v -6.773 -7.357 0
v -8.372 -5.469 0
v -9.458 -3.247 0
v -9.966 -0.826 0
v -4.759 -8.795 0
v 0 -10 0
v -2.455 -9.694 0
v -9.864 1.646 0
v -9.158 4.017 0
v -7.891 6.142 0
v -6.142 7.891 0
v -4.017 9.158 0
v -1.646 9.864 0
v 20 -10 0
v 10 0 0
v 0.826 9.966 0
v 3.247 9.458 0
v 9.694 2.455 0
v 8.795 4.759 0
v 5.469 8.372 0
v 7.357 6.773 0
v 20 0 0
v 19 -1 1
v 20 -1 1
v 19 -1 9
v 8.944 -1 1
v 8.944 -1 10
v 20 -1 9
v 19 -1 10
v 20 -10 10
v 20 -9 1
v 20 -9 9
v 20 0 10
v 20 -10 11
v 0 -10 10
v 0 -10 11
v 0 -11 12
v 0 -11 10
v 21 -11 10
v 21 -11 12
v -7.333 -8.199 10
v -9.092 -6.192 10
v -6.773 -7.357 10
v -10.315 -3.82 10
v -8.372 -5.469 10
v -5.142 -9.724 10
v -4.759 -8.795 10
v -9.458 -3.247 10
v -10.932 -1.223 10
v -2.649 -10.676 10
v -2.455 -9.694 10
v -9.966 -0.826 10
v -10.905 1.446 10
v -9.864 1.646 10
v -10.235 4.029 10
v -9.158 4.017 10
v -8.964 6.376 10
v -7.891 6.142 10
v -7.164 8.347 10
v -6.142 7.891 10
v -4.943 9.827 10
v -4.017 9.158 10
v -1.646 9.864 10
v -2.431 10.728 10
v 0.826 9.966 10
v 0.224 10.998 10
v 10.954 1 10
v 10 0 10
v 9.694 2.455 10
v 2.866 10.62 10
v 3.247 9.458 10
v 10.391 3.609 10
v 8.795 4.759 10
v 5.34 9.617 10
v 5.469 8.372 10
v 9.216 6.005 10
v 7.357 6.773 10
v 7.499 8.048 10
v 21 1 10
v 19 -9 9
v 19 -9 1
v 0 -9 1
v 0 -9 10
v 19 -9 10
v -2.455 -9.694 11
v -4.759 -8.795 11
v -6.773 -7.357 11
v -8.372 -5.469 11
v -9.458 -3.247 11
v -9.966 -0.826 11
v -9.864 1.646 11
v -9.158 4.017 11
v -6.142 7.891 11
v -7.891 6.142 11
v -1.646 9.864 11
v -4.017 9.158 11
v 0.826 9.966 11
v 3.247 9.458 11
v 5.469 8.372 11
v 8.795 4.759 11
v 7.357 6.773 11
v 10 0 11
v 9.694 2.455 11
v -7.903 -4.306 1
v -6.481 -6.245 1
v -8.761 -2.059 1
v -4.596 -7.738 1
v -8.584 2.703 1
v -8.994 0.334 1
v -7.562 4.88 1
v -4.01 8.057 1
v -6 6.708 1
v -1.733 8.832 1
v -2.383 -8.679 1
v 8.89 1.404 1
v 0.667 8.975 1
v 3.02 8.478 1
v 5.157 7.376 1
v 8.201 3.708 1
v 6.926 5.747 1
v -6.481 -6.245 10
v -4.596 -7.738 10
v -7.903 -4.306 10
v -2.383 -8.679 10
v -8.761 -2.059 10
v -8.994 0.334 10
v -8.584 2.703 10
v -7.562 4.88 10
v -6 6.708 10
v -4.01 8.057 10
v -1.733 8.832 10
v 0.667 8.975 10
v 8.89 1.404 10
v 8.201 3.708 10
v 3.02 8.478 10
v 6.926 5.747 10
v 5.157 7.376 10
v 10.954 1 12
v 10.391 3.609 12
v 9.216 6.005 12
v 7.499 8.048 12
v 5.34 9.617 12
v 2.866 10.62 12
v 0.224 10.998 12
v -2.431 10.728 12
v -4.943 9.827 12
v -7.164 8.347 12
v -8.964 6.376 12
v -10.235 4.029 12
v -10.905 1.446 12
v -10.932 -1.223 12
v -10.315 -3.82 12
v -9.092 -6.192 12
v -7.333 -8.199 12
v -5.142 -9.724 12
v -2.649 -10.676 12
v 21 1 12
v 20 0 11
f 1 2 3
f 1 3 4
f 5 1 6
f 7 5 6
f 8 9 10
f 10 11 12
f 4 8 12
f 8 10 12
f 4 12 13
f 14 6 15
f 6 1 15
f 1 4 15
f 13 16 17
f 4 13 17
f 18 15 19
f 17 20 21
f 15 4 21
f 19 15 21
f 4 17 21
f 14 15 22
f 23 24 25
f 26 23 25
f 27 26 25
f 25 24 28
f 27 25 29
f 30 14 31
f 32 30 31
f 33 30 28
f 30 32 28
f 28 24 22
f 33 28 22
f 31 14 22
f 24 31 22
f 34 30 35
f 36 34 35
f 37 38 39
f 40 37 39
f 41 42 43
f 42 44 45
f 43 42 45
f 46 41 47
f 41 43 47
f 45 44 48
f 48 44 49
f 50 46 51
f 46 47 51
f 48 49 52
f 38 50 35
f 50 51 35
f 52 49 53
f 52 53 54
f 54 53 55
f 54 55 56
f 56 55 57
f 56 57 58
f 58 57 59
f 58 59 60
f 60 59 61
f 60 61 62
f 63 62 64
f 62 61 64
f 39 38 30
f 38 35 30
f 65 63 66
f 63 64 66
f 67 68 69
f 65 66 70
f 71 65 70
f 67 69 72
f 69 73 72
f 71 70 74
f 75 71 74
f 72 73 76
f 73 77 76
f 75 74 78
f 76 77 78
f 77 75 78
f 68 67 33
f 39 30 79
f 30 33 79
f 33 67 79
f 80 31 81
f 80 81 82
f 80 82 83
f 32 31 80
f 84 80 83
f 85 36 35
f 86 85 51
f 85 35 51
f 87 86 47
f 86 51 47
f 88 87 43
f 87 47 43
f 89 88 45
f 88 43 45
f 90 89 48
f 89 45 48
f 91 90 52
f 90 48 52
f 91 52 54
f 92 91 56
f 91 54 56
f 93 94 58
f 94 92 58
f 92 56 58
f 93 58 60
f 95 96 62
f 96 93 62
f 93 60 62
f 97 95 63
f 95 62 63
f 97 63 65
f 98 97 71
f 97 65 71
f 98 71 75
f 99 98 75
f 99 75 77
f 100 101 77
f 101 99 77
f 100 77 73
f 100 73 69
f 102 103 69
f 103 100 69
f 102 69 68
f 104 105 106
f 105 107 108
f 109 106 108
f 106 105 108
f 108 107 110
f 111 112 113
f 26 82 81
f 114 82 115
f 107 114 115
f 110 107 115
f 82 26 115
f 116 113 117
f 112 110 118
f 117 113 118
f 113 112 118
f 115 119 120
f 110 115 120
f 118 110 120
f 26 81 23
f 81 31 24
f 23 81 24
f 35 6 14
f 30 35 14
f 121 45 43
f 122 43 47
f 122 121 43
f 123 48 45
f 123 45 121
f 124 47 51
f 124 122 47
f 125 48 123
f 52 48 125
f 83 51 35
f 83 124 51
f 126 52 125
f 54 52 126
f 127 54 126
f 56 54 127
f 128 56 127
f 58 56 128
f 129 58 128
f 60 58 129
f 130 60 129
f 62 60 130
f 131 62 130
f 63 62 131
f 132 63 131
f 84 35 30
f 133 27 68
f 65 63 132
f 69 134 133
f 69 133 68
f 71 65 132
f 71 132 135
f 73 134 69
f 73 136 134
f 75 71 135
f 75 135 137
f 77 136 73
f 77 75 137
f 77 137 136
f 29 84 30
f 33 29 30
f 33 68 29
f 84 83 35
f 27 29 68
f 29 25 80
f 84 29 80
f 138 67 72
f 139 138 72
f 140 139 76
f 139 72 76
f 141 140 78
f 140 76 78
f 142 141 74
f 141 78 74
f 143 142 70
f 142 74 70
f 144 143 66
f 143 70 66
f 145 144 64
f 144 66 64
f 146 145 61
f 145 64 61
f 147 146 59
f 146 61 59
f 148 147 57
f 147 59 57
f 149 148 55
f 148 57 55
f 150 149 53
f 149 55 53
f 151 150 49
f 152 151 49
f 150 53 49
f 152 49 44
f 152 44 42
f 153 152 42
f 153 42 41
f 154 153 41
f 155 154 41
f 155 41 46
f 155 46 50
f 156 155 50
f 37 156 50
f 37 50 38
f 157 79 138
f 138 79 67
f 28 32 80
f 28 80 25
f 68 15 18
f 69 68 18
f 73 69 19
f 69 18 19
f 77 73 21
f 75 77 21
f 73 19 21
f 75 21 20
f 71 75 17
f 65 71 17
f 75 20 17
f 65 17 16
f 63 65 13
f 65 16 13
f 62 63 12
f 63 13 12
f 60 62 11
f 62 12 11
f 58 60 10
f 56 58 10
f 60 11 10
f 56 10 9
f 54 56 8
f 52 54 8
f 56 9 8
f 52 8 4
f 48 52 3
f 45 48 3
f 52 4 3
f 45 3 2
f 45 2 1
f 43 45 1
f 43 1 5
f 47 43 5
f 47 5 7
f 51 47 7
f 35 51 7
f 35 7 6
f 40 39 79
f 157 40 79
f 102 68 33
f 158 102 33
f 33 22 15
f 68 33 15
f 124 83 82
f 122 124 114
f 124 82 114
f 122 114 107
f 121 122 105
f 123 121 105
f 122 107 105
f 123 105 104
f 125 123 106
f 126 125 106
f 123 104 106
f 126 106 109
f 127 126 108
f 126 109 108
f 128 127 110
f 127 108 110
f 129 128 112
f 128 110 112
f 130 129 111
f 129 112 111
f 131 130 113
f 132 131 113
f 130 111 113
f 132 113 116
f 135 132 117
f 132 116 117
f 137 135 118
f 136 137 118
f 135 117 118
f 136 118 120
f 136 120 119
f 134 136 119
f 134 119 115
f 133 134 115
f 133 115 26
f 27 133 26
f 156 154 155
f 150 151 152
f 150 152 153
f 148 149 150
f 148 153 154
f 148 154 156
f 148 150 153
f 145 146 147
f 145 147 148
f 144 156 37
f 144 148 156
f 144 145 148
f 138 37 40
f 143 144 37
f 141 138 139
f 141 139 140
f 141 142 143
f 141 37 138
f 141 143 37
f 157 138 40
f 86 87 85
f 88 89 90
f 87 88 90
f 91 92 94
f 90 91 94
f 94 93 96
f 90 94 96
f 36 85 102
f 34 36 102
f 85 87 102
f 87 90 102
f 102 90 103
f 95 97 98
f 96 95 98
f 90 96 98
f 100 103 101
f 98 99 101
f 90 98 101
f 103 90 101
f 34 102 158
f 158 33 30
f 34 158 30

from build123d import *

# Parameters (mm, degrees)
F1_DEPTH  = 10
F3_DEPTH  = 10
F4_W      = 7.999999905
F4_H      = 7.999999905
F5_DEPTH  = 1
F7_DEPTH  = 1
F9_DEPTH  = 2
F11_DEPTH = 1


with BuildPart() as f1:
    # F0 (on Top) → F1 (new body)
    with BuildSketch(Plane.XY):
        with BuildLine():
            ThreePointArc((0, -10), (7.0710678119, -7.0710678119), (10, 0))
            Line((10, 0), (0, 0))
            Line((0, 0), (0, -10))
        make_face()
        with BuildLine():
            Line((20, 0), (10, 0))
            ThreePointArc((10, 0), (7.0710678119, -7.0710678119), (0, -10))
            Line((0, -10), (20, -10))
            Line((20, -10), (20, 0))
        make_face()
        with BuildLine():
            Line((0, 0), (10, 0))
            ThreePointArc((10, 0), (-7.0710678119, 7.0710678119), (0, -10))
            Line((0, -10), (0, 0))
        make_face()
    extrude(amount=F1_DEPTH)

    # F2 (on face) → F3 (cut, through all)
    with BuildSketch(Plane(origin=(0, 0, 0), x_dir=(1, 0, 0), z_dir=(0, 0, -1))):
        with BuildLine():
            Line((19, 9), (0, 9))
            ThreePointArc((0, 9), (-6, -6.7082039325), (8.94427191, 1))
            Line((8.94427191, 1), (19, 1))
            Line((19, 1), (19, 9))
        make_face()
    extrude(amount=-F3_DEPTH, mode=Mode.SUBTRACT)

    # F4 (on face) → F5 (cut, through all)
    with BuildSketch(Plane.YZ.offset(20)):
        with Locations((-5, 5)):
            Rectangle(F4_W, F4_H)
    extrude(amount=-F5_DEPTH, mode=Mode.SUBTRACT)

    # F6 (on Top) → F7 (join)
    with BuildSketch(Plane.XY):
        with BuildLine():
            Line((20, 0), (10, 0))
            ThreePointArc((10, 0), (-7.0710678119, 7.0710678119), (0, -10))
            Line((0, -10), (20, -10))
            Line((20, -10), (20, 0))
        make_face()
    extrude(amount=F7_DEPTH)


with BuildPart() as f9:
    # F8 (on face) → F9 (new body)
    with BuildSketch(Plane.XY.offset(10)):
        with BuildLine():
            Line((21, 1), (10.9544511501, 1))
            ThreePointArc((10.9544511501, 1), (-8.1240384046, 7.4161984871), (0, -11))
            Line((0, -11), (21, -11))
            Line((21, -11), (21, 1))
        make_face()
        with BuildLine():
            Line((20, -10), (0, -10))
            ThreePointArc((0, -10), (-7.0710678119, 7.0710678119), (10, 0))
            Line((10, 0), (20, 0))
            Line((20, 0), (20, -10))
        make_face(mode=Mode.SUBTRACT)
    extrude(amount=F9_DEPTH)

    # F10 (on face) → F11 (join)
    with BuildSketch(Plane.XY.offset(12)):
        with BuildLine():
            Line((20, 0), (10, 0))
            ThreePointArc((10, 0), (-7.0710678119, 7.0710678119), (0, -10))
            Line((0, -10), (20, -10))
            Line((20, -10), (20, 0))
        make_face()
    extrude(amount=-F11_DEPTH)


solid = Compound([f1.part, f9.part])
